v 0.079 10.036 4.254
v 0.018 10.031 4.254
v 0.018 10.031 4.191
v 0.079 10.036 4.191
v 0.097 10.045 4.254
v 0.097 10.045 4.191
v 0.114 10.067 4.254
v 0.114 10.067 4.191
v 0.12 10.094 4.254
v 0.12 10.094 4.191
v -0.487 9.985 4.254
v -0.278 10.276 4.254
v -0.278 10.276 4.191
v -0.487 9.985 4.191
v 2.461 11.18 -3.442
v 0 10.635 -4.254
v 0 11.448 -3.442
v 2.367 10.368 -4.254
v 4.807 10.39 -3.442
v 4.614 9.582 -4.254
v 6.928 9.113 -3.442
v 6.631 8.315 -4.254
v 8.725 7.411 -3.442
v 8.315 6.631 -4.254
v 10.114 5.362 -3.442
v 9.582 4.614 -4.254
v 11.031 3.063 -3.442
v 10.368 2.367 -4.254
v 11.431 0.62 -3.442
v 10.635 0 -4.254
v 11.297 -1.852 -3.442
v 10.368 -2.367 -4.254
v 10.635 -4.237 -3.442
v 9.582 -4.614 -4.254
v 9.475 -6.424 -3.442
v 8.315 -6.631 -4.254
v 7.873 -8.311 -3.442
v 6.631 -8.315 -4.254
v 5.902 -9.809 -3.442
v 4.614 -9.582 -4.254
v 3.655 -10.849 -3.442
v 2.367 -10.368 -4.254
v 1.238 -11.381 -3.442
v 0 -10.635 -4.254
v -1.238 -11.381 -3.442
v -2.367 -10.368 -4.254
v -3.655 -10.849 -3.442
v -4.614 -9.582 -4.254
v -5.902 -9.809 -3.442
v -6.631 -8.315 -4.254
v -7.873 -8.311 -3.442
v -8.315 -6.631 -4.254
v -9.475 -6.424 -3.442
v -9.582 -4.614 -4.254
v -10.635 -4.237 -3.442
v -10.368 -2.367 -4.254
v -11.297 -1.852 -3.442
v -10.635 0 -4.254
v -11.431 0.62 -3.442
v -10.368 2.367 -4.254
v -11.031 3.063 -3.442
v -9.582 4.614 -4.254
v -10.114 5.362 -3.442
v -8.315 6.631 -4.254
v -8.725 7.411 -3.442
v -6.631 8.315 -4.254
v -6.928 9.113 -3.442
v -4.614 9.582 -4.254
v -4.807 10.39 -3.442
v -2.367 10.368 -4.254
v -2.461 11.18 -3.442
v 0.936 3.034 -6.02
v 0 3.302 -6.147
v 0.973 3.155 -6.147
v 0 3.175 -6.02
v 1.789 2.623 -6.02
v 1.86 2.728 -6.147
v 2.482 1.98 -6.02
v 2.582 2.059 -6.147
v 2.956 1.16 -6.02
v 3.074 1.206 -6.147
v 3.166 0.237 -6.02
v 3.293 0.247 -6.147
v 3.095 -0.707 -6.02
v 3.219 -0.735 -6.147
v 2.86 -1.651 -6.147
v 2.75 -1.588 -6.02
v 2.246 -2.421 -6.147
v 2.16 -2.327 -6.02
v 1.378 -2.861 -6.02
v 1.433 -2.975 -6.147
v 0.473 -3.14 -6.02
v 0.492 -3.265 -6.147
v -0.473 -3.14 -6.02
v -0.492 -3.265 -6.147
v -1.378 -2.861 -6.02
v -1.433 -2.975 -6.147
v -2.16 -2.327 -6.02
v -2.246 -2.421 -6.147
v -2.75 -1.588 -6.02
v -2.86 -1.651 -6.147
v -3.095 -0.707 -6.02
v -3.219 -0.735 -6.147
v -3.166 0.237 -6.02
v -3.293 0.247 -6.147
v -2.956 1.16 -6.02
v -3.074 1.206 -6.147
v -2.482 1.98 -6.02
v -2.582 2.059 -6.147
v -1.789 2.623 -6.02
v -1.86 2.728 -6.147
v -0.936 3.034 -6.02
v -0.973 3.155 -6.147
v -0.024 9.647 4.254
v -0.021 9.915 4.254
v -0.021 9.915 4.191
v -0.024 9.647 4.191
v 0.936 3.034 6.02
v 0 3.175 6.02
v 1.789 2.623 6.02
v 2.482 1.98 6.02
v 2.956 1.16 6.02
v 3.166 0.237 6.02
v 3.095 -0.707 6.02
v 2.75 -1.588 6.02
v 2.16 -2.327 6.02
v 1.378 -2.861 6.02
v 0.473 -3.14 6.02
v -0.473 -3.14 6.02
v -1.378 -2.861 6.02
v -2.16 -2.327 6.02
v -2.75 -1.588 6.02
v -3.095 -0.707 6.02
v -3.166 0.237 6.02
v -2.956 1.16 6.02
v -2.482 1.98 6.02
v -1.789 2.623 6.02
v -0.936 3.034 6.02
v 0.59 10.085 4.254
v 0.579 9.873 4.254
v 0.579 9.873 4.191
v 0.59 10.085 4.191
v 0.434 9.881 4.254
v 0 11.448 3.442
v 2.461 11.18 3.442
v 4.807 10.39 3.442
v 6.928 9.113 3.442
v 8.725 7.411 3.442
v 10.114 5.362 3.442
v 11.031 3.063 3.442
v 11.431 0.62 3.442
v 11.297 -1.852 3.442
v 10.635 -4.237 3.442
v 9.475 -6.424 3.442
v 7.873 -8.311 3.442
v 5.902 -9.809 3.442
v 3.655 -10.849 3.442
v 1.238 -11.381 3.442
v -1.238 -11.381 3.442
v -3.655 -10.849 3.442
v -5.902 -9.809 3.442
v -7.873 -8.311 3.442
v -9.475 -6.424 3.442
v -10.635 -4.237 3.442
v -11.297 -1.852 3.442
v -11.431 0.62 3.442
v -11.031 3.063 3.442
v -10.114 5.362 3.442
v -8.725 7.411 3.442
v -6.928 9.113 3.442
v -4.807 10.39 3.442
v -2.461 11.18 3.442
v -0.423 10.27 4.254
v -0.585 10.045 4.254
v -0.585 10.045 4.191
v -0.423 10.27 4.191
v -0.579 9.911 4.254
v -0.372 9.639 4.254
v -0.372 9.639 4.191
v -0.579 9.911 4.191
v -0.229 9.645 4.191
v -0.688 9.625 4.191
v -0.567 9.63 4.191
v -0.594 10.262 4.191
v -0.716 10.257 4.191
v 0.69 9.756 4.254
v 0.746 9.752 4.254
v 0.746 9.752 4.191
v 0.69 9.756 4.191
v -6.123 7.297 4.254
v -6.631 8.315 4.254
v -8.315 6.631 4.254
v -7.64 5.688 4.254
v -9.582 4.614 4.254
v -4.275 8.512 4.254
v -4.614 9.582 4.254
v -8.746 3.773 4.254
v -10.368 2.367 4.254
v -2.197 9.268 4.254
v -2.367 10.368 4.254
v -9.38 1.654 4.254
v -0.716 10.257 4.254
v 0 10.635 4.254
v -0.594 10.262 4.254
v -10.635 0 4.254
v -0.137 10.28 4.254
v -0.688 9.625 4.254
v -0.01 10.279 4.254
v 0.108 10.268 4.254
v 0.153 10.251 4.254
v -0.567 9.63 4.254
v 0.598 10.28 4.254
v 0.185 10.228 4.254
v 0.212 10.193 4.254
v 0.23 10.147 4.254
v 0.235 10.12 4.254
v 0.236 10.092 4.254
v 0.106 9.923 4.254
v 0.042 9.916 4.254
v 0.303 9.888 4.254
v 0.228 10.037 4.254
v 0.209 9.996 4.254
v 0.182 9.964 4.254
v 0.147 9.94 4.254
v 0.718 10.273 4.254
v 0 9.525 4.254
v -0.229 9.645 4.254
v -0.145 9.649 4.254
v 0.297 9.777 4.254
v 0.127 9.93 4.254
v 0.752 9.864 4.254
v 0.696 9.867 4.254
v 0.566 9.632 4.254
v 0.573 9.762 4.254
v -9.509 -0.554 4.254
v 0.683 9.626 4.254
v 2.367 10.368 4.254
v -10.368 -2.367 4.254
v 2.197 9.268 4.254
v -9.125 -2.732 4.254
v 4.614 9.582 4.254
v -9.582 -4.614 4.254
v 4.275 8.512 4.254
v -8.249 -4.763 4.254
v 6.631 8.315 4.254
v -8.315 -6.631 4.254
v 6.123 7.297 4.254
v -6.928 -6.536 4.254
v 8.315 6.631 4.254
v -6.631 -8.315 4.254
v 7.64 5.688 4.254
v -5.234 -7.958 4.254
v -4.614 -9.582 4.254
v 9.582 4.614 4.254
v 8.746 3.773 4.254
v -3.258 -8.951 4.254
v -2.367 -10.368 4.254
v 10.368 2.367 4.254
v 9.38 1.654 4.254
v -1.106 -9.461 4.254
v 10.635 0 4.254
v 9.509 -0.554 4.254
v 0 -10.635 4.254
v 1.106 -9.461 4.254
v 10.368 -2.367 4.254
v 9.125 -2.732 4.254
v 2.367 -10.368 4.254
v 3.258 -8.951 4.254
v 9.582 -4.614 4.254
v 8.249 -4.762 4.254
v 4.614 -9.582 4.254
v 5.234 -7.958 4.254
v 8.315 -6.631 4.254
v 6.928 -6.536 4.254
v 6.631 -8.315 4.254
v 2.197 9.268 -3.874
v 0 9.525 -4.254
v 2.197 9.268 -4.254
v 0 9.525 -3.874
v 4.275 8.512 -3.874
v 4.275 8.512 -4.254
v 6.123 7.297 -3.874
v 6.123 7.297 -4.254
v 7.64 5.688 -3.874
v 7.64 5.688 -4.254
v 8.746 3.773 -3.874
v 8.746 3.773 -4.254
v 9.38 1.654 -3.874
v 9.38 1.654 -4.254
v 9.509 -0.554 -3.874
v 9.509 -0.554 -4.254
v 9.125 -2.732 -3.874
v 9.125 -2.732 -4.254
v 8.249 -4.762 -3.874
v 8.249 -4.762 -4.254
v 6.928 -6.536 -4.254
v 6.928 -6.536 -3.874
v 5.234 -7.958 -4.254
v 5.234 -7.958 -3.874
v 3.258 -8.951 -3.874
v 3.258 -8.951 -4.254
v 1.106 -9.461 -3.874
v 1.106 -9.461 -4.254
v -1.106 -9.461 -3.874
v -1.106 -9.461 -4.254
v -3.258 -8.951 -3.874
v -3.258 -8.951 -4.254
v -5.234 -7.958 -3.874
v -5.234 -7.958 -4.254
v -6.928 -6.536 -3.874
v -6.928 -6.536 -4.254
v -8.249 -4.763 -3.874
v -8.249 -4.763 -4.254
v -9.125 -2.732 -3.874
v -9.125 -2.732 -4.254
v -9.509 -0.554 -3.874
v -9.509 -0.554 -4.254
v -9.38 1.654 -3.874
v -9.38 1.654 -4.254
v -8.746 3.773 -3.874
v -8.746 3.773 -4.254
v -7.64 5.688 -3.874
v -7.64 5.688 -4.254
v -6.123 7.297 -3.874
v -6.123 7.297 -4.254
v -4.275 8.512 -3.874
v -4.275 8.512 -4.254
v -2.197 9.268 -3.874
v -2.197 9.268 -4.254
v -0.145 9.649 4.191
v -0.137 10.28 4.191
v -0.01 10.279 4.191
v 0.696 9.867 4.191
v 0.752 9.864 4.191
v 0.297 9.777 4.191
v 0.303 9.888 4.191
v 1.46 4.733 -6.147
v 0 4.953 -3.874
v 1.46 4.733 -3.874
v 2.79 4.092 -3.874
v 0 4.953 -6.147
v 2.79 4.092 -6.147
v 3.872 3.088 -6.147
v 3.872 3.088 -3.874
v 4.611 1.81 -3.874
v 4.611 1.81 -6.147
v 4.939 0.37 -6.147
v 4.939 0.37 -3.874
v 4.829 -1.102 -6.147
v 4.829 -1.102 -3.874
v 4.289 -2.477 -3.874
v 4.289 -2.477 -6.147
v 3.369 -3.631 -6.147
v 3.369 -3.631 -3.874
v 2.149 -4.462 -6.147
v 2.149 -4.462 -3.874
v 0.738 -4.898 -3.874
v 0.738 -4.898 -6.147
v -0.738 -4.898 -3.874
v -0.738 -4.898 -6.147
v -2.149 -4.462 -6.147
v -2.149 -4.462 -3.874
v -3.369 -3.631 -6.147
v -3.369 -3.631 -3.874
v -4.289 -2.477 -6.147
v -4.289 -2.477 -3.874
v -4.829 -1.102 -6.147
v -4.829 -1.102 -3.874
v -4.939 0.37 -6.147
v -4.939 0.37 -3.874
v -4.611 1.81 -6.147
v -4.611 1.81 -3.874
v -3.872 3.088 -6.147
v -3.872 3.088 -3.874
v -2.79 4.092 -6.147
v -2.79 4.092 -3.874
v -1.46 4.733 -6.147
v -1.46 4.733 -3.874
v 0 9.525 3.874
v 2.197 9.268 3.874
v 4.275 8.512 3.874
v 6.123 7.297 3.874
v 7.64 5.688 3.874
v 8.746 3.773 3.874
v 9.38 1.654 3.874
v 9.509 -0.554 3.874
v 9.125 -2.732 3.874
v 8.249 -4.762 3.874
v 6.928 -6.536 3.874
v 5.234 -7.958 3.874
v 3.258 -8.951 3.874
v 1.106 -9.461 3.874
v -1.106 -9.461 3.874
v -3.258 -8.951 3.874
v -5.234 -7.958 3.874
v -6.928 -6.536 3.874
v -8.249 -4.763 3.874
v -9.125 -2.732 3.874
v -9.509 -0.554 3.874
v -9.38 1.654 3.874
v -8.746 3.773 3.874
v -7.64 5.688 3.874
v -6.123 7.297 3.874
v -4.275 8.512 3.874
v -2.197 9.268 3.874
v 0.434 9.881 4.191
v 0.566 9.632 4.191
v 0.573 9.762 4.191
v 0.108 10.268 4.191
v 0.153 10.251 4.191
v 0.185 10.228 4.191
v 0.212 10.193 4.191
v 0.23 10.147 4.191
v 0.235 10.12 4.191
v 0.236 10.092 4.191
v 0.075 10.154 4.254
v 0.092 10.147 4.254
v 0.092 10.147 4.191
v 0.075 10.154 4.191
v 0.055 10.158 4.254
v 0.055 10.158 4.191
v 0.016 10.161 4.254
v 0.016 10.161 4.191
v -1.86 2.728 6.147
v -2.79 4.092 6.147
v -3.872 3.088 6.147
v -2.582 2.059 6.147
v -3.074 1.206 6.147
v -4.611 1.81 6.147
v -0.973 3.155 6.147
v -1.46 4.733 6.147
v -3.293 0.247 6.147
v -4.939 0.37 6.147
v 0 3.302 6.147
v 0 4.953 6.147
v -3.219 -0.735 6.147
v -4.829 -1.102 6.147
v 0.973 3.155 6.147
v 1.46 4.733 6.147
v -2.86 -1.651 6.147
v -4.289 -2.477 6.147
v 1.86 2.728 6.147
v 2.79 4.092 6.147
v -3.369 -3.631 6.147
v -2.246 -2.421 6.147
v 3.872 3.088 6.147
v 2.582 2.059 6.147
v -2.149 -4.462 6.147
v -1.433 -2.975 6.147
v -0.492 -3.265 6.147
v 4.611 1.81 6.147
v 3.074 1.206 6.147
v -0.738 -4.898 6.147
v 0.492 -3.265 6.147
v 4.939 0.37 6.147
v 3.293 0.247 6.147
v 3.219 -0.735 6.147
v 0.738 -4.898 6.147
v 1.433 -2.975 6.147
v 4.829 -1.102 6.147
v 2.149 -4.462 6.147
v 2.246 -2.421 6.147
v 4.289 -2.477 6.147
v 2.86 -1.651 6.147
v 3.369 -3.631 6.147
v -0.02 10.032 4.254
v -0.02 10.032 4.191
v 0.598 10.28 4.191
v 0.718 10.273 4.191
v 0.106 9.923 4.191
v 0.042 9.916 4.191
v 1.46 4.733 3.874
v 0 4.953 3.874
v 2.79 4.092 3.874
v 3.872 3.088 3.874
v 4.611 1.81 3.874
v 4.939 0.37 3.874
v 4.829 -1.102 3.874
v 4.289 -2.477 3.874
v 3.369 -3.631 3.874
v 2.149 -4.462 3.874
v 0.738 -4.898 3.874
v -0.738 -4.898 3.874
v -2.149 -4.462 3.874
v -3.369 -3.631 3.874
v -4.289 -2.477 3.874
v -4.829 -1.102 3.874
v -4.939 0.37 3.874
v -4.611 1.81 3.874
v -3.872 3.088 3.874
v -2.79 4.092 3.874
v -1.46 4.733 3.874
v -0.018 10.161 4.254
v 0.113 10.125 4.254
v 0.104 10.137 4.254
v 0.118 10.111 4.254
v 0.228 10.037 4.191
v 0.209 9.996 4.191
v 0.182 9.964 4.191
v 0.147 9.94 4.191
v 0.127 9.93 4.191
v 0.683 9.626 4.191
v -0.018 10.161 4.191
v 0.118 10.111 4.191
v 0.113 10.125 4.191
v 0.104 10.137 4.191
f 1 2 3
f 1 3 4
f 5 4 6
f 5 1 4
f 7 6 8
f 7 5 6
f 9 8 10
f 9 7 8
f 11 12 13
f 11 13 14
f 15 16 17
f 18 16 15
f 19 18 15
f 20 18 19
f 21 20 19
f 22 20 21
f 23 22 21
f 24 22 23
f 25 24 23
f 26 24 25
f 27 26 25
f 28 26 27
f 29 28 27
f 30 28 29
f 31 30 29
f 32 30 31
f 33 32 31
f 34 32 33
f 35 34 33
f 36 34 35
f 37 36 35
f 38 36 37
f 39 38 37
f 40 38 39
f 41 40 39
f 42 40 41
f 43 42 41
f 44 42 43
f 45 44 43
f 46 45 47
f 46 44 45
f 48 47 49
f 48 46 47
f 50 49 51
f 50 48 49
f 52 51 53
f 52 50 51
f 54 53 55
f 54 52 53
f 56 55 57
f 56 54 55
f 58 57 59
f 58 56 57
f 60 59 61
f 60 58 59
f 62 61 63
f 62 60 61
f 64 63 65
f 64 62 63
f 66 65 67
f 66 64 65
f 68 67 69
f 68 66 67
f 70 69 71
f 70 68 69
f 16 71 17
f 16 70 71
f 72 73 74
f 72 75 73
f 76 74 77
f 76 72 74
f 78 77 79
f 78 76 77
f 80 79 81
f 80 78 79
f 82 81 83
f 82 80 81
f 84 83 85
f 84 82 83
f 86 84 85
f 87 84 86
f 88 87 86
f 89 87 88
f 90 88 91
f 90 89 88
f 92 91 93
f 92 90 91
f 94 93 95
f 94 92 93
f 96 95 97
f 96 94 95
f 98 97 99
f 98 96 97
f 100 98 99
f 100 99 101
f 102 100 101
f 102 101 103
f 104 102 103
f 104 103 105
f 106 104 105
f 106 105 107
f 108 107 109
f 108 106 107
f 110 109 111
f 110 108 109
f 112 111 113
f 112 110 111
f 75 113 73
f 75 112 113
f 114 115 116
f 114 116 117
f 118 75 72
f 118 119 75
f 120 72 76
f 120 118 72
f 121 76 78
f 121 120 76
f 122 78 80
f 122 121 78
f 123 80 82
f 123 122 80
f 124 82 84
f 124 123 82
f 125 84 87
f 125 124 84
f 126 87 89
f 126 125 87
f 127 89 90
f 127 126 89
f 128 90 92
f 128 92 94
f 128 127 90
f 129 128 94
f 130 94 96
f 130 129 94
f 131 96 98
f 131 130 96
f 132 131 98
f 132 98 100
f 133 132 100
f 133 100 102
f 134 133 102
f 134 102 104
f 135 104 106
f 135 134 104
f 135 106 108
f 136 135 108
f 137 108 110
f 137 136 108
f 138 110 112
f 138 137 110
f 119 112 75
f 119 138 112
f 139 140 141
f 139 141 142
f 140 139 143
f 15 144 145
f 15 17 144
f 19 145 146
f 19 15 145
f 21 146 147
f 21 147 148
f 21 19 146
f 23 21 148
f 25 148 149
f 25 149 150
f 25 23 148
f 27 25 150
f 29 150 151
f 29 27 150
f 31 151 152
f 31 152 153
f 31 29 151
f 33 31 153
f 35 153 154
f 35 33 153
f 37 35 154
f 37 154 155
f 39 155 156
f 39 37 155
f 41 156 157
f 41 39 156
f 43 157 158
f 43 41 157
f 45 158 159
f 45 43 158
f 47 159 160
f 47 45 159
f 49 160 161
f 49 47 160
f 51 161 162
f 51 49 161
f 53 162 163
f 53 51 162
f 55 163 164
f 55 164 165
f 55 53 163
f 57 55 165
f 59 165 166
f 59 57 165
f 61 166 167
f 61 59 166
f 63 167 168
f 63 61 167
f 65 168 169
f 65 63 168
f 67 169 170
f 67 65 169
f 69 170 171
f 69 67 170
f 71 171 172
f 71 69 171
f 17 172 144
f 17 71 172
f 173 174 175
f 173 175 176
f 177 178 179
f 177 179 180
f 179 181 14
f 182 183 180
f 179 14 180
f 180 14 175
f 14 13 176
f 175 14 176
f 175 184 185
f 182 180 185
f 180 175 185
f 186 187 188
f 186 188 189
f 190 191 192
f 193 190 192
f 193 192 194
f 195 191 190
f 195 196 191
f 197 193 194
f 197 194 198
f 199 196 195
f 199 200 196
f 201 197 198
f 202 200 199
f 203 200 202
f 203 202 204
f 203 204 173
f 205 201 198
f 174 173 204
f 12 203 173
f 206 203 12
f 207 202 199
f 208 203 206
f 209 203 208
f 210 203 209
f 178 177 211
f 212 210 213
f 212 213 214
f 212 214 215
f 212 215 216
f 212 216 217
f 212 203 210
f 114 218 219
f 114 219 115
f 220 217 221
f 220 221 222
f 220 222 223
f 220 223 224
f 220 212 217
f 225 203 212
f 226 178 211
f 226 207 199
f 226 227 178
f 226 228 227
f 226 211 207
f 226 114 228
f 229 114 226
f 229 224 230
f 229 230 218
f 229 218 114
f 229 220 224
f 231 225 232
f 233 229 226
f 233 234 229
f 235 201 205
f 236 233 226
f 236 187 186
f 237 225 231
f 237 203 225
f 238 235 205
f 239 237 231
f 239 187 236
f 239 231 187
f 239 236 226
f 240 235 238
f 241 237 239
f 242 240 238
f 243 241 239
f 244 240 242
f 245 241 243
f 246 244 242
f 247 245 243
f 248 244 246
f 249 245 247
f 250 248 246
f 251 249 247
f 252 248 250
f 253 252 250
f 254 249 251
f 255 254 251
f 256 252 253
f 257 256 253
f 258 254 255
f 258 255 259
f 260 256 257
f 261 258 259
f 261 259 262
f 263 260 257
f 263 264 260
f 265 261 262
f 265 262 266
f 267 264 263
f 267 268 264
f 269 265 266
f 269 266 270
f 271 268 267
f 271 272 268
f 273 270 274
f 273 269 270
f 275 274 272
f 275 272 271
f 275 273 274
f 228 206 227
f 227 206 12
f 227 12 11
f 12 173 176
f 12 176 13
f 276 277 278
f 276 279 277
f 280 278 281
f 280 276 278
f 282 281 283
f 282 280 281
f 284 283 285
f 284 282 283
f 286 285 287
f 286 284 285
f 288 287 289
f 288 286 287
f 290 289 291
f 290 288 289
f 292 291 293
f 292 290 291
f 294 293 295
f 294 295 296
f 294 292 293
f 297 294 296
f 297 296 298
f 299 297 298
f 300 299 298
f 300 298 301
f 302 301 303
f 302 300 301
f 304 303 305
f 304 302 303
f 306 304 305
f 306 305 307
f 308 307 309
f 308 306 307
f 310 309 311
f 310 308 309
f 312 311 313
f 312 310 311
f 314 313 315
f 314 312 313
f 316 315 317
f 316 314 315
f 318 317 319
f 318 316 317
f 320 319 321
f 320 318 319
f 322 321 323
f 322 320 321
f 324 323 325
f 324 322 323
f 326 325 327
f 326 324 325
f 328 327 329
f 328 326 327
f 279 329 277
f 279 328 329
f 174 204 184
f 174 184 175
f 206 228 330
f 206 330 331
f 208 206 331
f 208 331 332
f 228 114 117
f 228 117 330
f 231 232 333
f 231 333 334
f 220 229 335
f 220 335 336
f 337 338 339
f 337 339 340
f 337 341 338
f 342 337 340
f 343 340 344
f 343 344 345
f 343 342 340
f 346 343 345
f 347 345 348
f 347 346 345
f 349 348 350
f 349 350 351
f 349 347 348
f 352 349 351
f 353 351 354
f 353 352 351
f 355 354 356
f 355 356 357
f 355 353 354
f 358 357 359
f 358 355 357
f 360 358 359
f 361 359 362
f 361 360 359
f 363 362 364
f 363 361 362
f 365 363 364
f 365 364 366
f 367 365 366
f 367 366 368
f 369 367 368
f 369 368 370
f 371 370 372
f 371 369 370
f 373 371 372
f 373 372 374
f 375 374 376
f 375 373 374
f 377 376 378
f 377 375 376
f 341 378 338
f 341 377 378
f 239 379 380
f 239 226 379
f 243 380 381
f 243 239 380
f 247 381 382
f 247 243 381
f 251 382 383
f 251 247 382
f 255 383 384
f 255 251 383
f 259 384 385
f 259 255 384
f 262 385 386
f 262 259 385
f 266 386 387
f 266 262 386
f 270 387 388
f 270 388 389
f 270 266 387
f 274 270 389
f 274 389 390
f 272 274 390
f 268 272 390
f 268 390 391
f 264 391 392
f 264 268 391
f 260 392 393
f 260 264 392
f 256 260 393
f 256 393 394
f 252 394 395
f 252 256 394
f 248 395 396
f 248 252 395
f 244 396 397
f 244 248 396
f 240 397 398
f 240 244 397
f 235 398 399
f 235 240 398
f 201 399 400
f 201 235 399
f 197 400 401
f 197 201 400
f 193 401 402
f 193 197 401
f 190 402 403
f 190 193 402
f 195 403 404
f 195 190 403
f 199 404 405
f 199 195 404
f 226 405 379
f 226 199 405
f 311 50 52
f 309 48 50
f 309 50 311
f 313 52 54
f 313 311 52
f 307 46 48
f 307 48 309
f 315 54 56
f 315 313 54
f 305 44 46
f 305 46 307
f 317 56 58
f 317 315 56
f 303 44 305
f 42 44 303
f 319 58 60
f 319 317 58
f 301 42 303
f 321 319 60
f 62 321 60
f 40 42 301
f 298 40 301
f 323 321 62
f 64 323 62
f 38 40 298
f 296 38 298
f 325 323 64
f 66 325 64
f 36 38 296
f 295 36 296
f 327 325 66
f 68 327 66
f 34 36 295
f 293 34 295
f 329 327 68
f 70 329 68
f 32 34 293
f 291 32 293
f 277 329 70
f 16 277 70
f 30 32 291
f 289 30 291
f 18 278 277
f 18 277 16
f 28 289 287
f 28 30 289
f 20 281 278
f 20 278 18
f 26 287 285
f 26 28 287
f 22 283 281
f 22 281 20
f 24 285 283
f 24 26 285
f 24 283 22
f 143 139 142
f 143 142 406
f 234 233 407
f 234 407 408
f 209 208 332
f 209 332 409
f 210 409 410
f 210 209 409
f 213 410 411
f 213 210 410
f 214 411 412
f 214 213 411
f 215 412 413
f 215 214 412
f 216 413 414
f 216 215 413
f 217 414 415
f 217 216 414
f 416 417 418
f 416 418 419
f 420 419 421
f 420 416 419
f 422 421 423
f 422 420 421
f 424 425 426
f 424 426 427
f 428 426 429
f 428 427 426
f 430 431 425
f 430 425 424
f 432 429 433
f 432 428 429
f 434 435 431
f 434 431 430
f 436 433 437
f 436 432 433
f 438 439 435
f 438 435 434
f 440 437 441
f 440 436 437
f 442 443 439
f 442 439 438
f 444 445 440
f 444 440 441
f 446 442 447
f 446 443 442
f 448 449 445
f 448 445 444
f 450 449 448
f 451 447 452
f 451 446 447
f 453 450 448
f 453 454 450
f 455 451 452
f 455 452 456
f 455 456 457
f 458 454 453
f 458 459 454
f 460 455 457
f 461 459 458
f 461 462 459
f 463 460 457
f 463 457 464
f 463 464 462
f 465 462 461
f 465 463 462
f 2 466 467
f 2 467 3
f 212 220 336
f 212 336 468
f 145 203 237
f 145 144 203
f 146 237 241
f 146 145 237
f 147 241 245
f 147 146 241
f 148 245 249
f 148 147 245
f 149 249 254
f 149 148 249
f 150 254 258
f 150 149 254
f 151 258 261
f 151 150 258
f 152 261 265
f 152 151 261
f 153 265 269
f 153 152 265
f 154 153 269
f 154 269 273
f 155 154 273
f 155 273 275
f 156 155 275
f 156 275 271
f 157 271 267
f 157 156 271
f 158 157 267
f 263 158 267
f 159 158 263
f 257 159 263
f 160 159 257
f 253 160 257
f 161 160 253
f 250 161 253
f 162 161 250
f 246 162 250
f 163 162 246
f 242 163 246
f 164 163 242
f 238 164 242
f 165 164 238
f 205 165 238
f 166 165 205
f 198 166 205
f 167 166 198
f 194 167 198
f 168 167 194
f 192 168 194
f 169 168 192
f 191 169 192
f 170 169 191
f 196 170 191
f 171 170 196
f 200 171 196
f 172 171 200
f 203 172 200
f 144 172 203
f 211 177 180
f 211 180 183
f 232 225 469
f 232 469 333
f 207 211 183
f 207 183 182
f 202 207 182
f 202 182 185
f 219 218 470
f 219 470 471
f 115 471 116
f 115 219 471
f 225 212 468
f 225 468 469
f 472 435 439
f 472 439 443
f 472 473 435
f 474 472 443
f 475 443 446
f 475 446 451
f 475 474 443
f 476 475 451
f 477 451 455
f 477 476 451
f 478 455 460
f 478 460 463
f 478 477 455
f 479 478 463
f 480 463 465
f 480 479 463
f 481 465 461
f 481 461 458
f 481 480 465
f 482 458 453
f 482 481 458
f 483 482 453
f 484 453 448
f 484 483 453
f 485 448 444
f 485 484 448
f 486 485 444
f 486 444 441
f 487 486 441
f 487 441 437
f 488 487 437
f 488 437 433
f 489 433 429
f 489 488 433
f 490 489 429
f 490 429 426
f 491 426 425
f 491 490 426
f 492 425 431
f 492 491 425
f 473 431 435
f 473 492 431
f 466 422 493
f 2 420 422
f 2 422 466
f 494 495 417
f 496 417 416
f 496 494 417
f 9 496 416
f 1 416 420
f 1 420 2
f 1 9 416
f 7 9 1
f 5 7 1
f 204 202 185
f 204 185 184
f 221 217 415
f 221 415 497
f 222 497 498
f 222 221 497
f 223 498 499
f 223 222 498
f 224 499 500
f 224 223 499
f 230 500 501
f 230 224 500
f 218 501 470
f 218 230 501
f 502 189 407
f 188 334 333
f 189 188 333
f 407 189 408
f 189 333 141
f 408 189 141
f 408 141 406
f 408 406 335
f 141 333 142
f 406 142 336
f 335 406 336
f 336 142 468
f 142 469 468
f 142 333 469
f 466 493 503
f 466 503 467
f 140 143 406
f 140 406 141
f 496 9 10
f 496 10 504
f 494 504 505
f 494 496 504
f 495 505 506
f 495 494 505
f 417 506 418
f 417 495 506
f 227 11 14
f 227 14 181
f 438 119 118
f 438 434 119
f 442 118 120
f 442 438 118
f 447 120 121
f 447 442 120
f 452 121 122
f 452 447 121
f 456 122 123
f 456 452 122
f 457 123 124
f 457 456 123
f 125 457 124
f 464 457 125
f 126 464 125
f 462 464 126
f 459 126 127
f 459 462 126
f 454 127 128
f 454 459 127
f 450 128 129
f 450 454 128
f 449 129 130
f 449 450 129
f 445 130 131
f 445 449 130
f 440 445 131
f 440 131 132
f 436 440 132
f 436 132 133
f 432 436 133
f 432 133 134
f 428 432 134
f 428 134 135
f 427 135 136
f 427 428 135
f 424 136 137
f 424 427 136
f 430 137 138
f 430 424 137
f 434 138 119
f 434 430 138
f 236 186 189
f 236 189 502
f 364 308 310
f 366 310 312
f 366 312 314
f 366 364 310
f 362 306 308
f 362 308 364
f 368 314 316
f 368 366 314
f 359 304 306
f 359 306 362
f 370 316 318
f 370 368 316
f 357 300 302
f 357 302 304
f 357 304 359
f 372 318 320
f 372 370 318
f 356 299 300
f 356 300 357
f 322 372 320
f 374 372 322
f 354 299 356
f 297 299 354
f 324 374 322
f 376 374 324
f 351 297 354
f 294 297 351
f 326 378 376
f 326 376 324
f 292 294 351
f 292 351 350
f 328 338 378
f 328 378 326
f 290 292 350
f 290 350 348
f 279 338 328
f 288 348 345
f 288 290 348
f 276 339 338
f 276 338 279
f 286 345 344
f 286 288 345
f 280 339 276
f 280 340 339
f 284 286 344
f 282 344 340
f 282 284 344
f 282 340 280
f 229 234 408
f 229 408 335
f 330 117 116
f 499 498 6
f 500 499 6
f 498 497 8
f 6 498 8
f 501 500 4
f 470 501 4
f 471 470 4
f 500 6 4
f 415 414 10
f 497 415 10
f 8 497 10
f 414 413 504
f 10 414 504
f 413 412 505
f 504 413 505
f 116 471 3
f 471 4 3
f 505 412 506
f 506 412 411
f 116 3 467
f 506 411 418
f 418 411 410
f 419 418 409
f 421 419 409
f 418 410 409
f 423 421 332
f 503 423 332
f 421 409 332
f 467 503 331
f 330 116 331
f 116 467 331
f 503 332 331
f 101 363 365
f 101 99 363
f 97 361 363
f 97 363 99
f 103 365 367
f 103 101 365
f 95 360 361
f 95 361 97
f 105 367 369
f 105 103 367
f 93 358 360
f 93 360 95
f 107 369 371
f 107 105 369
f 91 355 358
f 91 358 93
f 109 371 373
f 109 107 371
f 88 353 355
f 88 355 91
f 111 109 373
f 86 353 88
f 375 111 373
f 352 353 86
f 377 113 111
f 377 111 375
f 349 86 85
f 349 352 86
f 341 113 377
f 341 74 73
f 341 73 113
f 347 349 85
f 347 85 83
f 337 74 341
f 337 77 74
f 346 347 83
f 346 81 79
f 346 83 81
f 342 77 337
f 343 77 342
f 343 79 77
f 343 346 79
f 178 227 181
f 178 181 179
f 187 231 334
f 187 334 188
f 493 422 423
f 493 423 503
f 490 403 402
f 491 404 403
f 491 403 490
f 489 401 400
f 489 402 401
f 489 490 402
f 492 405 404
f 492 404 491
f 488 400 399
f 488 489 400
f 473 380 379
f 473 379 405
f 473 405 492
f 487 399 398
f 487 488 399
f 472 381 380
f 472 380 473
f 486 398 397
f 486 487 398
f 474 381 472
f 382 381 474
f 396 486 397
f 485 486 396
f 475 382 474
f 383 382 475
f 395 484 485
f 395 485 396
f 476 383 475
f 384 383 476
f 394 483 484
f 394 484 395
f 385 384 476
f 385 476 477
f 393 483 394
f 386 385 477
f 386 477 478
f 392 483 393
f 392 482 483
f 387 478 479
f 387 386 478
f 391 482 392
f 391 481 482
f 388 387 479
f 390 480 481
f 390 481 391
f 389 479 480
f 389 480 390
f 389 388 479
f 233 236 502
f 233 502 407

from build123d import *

# Parameters (mm, degrees)
CUT_EXTRUDE1_DEPTH = 0.0635


with BuildPart() as part:
    # Sketch1 → Revolve1 (revolve)
    with BuildSketch(Plane(origin=(0, 0, 0), x_dir=(0, 0, -1), z_dir=(1, 0, 0))):
        Polygon((-6.1468, 3.302), (-6.1468, 4.953), (-3.8735, 4.953), (-3.8735, 9.525), (-4.2545, 9.525), (-4.2545, 10.63498), (-3.4417, 11.44778), (3.4417, 11.44778), (4.2545, 10.63498), (4.2545, 9.525), (3.8735, 9.525), (3.8735, 4.953), (6.1468, 4.953), (6.1468, 3.302), (6.0198, 3.175), (-6.0198, 3.175), align=None)
    revolve(axis=Axis((0, 0, 0), (0, 0, -1)))

    # Sketch2 → Cut-Extrude1 (cut)
    with BuildSketch(Plane.XY.offset(4.2545)):
        Polygon((-0.715797037, 10.256682265), (-0.59431767, 10.262024813), (-0.584777405, 10.044761191), (-0.422974521, 10.269529821), (-0.278344112, 10.275889997), (-0.486703487, 9.984593924), (-0.229243551, 9.645214917), (-0.371838703, 9.638981945), (-0.578926043, 9.910815879), (-0.566714505, 9.630459308), (-0.688193872, 9.62511676), align=None)
        with BuildLine():
            Line((-0.137056778, 10.280248194), (-0.009598846, 10.278721752))
            add(Edge.make_bspline(
                [(-0.009598846, 10.278721752), (-0.001287185, 10.278547688), (0.014749364, 10.278211849), (0.03791593, 10.277113779), (0.059251361, 10.275324059), (0.078823772, 10.273084067), (0.09658198, 10.270220031), (0.112510114, 10.266682791), (0.126614201, 10.262601864), (0.139181226, 10.258063486), (0.150404482, 10.252540227), (0.160921964, 10.246543676), (0.170857479, 10.23986336), (0.180015832, 10.232238122), (0.18873639, 10.22412794), (0.196758904, 10.215173588), (0.20416167, 10.205477286), (0.210872704, 10.195028329), (0.216953317, 10.184045094), (0.222263409, 10.172503694), (0.226470626, 10.160357095), (0.230295983, 10.147804967), (0.232853006, 10.134621192), (0.234815576, 10.120999554), (0.235807514, 10.106842586), (0.235871459, 10.09724597), (0.235903959, 10.092368587)],
                knots=[0, 0, 0, 0, 2.494e-05, 4.8119e-05, 6.9564e-05, 8.916e-05, 0.000107207, 0.000123502, 0.000138074, 0.000151235, 0.000163524, 0.000175547, 0.000187542, 0.000199383, 0.000211261, 0.000223241, 0.000235402, 0.000247822, 0.000260461, 0.000273041, 0.000285876, 0.000298999, 0.00031237, 0.000326114, 0.00034027, 0.000354901, 0.000354901, 0.000354901, 0.000354901], degree=3))
            add(Edge.make_bspline(
                [(0.235903959, 10.092368587), (0.235726012, 10.086978535), (0.235376195, 10.076382465), (0.233555914, 10.06086812), (0.230820019, 10.046045066), (0.226846103, 10.031957239), (0.221762472, 10.018597169), (0.21559979, 10.005933869), (0.208512368, 9.993900042), (0.200177911, 9.982742598), (0.191049434, 9.97230186), (0.181048202, 9.962734678), (0.170368482, 9.953924746), (0.158877942, 9.946006271), (0.146611538, 9.939059919), (0.133705365, 9.932726844), (0.119932481, 9.927410793), (0.110374057, 9.924525718), (0.105520345, 9.923060694)],
                knots=[0, 0, 0, 0, 1.6173e-05, 3.1794e-05, 4.6812e-05, 6.135e-05, 7.5642e-05, 8.9638e-05, 0.000103556, 0.000117472, 0.000131353, 0.000145118, 0.000158945, 0.000172847, 0.000186921, 0.000201201, 0.000215941, 0.000231148, 0.000231148, 0.000231148, 0.000231148], degree=3))
            add(Edge.make_bspline(
                [(0.105520345, 9.923060694), (0.102347959, 9.922302526), (0.09541168, 9.920644826), (0.084019105, 9.918830767), (0.070821383, 9.917299868), (0.055878254, 9.91624699), (0.039130219, 9.915304899), (0.020635268, 9.914885629), (0.000323735, 9.914573099), (-0.013796465, 9.914717181), (-0.021174367, 9.914792465)],
                knots=[0, 0, 0, 0, 9.782e-06, 2.1389e-05, 3.4579e-05, 4.9633e-05, 6.632e-05, 8.4899e-05, 0.000105126, 0.00012726, 0.00012726, 0.00012726, 0.00012726], degree=3))
            Line((-0.021174367, 9.914792465), (-0.024481658, 9.647283451))
            Line((-0.024481658, 9.647283451), (-0.14468899, 9.648682689))
            Line((-0.14468899, 9.648682689), (-0.137056778, 10.280248194))
        make_face()
        with BuildLine():
            Line((-0.019775128, 10.031946912), (0.01838593, 10.031438098))
            add(Edge.make_bspline(
                [(0.01838593, 10.031438098), (0.025341366, 10.031399241), (0.038074588, 10.031328107), (0.055487961, 10.032349425), (0.06951657, 10.033931542), (0.080657527, 10.0365482), (0.089494488, 10.040499929), (0.097092732, 10.045183773), (0.103672216, 10.051029279), (0.109309451, 10.057830338), (0.113976457, 10.065587683), (0.117032077, 10.074351893), (0.119207899, 10.083784291), (0.119492561, 10.090362271), (0.119639936, 10.093767826)],
                knots=[0, 0, 0, 0, 2.0862e-05, 3.8191e-05, 5.2297e-05, 6.3187e-05, 7.2357e-05, 8.1216e-05, 8.9868e-05, 9.863e-05, 0.00010764, 0.000116856, 0.000126362, 0.000136567, 0.000136567, 0.000136567, 0.000136567], degree=3))
            add(Edge.make_bspline(
                [(0.119639936, 10.093767826), (0.119562982, 10.096695704), (0.119412912, 10.102405414), (0.118359789, 10.110681571), (0.116121516, 10.118318497), (0.113057229, 10.125379216), (0.109137816, 10.131858318), (0.104301671, 10.13772663), (0.09857412, 10.142976641), (0.094159169, 10.145854249), (0.091909568, 10.14732051)],
                knots=[0, 0, 0, 0, 8.785e-06, 1.7132e-05, 2.4943e-05, 3.2576e-05, 4.0168e-05, 4.7579e-05, 5.5322e-05, 6.3367e-05, 6.3367e-05, 6.3367e-05, 6.3367e-05], degree=3))
            add(Edge.make_bspline(
                [(0.091909568, 10.14732051), (0.090027961, 10.148394937), (0.086056367, 10.150662781), (0.07913742, 10.153076263), (0.071314393, 10.15542692), (0.062261301, 10.157108271), (0.052170636, 10.158639954), (0.040923672, 10.159801584), (0.028609183, 10.160347889), (0.020039846, 10.160564391), (0.015587452, 10.16067688)],
                knots=[0, 0, 0, 0, 6.487e-06, 1.3693e-05, 2.1905e-05, 3.0986e-05, 4.1276e-05, 5.2528e-05, 6.4884e-05, 7.8245e-05, 7.8245e-05, 7.8245e-05, 7.8245e-05], degree=3))
            Line((0.015587452, 10.16067688), (-0.018248685, 10.161185694))
            Line((-0.018248685, 10.161185694), (-0.019775128, 10.031946912))
        make_face(mode=Mode.SUBTRACT)
        Polygon((0.598009372, 10.279863333), (0.718216704, 10.273375953), (0.696210494, 9.866706281), (0.752434453, 9.863653397), (0.746328683, 9.752477515), (0.690104725, 9.7555304), (0.683108531, 9.625910007), (0.565572473, 9.632270184), (0.572568667, 9.761890576), (0.296918627, 9.776773389), (0.303024397, 9.88794927), align=None)
        Polygon((0.578674437, 9.873066458), (0.590122754, 10.084733124), (0.434425638, 9.880825873), align=None, mode=Mode.SUBTRACT)
    extrude(amount=-CUT_EXTRUDE1_DEPTH, mode=Mode.SUBTRACT)


solid = part.part
